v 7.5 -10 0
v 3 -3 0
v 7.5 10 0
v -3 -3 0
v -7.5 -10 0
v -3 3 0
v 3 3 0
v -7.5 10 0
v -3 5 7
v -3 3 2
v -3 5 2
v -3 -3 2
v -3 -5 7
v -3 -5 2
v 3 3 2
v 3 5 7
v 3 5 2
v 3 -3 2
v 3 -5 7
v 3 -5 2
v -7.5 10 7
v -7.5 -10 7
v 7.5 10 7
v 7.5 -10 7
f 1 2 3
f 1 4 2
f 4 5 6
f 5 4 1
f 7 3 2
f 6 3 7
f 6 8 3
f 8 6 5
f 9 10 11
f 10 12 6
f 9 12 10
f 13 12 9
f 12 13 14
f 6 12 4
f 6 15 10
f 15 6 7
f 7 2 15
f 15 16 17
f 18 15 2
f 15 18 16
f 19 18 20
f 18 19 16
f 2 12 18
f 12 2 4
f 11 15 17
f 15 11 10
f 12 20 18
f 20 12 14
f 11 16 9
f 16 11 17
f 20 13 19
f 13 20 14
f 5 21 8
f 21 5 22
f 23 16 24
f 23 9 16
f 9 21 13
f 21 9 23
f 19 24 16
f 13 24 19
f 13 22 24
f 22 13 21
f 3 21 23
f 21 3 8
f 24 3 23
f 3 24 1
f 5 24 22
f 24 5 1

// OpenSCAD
//$fn=60;
$fa=5;
$fs=.4;

difference(){
    body_all();
    mount_hole_for_nut();
}

module body_all(){
    linear_extrude(height=7){
        square([15,20],center=true);
    }
}

module mount_hole_for_nut(x=0,y=0){
    translate([x,y,0]){
        linear_extrude(height=10){
            square([6,6],center=true);
        }
        translate([0,0,2]) linear_extrude(height=10){
            square([6,10],center=true);
        }
    }
}
